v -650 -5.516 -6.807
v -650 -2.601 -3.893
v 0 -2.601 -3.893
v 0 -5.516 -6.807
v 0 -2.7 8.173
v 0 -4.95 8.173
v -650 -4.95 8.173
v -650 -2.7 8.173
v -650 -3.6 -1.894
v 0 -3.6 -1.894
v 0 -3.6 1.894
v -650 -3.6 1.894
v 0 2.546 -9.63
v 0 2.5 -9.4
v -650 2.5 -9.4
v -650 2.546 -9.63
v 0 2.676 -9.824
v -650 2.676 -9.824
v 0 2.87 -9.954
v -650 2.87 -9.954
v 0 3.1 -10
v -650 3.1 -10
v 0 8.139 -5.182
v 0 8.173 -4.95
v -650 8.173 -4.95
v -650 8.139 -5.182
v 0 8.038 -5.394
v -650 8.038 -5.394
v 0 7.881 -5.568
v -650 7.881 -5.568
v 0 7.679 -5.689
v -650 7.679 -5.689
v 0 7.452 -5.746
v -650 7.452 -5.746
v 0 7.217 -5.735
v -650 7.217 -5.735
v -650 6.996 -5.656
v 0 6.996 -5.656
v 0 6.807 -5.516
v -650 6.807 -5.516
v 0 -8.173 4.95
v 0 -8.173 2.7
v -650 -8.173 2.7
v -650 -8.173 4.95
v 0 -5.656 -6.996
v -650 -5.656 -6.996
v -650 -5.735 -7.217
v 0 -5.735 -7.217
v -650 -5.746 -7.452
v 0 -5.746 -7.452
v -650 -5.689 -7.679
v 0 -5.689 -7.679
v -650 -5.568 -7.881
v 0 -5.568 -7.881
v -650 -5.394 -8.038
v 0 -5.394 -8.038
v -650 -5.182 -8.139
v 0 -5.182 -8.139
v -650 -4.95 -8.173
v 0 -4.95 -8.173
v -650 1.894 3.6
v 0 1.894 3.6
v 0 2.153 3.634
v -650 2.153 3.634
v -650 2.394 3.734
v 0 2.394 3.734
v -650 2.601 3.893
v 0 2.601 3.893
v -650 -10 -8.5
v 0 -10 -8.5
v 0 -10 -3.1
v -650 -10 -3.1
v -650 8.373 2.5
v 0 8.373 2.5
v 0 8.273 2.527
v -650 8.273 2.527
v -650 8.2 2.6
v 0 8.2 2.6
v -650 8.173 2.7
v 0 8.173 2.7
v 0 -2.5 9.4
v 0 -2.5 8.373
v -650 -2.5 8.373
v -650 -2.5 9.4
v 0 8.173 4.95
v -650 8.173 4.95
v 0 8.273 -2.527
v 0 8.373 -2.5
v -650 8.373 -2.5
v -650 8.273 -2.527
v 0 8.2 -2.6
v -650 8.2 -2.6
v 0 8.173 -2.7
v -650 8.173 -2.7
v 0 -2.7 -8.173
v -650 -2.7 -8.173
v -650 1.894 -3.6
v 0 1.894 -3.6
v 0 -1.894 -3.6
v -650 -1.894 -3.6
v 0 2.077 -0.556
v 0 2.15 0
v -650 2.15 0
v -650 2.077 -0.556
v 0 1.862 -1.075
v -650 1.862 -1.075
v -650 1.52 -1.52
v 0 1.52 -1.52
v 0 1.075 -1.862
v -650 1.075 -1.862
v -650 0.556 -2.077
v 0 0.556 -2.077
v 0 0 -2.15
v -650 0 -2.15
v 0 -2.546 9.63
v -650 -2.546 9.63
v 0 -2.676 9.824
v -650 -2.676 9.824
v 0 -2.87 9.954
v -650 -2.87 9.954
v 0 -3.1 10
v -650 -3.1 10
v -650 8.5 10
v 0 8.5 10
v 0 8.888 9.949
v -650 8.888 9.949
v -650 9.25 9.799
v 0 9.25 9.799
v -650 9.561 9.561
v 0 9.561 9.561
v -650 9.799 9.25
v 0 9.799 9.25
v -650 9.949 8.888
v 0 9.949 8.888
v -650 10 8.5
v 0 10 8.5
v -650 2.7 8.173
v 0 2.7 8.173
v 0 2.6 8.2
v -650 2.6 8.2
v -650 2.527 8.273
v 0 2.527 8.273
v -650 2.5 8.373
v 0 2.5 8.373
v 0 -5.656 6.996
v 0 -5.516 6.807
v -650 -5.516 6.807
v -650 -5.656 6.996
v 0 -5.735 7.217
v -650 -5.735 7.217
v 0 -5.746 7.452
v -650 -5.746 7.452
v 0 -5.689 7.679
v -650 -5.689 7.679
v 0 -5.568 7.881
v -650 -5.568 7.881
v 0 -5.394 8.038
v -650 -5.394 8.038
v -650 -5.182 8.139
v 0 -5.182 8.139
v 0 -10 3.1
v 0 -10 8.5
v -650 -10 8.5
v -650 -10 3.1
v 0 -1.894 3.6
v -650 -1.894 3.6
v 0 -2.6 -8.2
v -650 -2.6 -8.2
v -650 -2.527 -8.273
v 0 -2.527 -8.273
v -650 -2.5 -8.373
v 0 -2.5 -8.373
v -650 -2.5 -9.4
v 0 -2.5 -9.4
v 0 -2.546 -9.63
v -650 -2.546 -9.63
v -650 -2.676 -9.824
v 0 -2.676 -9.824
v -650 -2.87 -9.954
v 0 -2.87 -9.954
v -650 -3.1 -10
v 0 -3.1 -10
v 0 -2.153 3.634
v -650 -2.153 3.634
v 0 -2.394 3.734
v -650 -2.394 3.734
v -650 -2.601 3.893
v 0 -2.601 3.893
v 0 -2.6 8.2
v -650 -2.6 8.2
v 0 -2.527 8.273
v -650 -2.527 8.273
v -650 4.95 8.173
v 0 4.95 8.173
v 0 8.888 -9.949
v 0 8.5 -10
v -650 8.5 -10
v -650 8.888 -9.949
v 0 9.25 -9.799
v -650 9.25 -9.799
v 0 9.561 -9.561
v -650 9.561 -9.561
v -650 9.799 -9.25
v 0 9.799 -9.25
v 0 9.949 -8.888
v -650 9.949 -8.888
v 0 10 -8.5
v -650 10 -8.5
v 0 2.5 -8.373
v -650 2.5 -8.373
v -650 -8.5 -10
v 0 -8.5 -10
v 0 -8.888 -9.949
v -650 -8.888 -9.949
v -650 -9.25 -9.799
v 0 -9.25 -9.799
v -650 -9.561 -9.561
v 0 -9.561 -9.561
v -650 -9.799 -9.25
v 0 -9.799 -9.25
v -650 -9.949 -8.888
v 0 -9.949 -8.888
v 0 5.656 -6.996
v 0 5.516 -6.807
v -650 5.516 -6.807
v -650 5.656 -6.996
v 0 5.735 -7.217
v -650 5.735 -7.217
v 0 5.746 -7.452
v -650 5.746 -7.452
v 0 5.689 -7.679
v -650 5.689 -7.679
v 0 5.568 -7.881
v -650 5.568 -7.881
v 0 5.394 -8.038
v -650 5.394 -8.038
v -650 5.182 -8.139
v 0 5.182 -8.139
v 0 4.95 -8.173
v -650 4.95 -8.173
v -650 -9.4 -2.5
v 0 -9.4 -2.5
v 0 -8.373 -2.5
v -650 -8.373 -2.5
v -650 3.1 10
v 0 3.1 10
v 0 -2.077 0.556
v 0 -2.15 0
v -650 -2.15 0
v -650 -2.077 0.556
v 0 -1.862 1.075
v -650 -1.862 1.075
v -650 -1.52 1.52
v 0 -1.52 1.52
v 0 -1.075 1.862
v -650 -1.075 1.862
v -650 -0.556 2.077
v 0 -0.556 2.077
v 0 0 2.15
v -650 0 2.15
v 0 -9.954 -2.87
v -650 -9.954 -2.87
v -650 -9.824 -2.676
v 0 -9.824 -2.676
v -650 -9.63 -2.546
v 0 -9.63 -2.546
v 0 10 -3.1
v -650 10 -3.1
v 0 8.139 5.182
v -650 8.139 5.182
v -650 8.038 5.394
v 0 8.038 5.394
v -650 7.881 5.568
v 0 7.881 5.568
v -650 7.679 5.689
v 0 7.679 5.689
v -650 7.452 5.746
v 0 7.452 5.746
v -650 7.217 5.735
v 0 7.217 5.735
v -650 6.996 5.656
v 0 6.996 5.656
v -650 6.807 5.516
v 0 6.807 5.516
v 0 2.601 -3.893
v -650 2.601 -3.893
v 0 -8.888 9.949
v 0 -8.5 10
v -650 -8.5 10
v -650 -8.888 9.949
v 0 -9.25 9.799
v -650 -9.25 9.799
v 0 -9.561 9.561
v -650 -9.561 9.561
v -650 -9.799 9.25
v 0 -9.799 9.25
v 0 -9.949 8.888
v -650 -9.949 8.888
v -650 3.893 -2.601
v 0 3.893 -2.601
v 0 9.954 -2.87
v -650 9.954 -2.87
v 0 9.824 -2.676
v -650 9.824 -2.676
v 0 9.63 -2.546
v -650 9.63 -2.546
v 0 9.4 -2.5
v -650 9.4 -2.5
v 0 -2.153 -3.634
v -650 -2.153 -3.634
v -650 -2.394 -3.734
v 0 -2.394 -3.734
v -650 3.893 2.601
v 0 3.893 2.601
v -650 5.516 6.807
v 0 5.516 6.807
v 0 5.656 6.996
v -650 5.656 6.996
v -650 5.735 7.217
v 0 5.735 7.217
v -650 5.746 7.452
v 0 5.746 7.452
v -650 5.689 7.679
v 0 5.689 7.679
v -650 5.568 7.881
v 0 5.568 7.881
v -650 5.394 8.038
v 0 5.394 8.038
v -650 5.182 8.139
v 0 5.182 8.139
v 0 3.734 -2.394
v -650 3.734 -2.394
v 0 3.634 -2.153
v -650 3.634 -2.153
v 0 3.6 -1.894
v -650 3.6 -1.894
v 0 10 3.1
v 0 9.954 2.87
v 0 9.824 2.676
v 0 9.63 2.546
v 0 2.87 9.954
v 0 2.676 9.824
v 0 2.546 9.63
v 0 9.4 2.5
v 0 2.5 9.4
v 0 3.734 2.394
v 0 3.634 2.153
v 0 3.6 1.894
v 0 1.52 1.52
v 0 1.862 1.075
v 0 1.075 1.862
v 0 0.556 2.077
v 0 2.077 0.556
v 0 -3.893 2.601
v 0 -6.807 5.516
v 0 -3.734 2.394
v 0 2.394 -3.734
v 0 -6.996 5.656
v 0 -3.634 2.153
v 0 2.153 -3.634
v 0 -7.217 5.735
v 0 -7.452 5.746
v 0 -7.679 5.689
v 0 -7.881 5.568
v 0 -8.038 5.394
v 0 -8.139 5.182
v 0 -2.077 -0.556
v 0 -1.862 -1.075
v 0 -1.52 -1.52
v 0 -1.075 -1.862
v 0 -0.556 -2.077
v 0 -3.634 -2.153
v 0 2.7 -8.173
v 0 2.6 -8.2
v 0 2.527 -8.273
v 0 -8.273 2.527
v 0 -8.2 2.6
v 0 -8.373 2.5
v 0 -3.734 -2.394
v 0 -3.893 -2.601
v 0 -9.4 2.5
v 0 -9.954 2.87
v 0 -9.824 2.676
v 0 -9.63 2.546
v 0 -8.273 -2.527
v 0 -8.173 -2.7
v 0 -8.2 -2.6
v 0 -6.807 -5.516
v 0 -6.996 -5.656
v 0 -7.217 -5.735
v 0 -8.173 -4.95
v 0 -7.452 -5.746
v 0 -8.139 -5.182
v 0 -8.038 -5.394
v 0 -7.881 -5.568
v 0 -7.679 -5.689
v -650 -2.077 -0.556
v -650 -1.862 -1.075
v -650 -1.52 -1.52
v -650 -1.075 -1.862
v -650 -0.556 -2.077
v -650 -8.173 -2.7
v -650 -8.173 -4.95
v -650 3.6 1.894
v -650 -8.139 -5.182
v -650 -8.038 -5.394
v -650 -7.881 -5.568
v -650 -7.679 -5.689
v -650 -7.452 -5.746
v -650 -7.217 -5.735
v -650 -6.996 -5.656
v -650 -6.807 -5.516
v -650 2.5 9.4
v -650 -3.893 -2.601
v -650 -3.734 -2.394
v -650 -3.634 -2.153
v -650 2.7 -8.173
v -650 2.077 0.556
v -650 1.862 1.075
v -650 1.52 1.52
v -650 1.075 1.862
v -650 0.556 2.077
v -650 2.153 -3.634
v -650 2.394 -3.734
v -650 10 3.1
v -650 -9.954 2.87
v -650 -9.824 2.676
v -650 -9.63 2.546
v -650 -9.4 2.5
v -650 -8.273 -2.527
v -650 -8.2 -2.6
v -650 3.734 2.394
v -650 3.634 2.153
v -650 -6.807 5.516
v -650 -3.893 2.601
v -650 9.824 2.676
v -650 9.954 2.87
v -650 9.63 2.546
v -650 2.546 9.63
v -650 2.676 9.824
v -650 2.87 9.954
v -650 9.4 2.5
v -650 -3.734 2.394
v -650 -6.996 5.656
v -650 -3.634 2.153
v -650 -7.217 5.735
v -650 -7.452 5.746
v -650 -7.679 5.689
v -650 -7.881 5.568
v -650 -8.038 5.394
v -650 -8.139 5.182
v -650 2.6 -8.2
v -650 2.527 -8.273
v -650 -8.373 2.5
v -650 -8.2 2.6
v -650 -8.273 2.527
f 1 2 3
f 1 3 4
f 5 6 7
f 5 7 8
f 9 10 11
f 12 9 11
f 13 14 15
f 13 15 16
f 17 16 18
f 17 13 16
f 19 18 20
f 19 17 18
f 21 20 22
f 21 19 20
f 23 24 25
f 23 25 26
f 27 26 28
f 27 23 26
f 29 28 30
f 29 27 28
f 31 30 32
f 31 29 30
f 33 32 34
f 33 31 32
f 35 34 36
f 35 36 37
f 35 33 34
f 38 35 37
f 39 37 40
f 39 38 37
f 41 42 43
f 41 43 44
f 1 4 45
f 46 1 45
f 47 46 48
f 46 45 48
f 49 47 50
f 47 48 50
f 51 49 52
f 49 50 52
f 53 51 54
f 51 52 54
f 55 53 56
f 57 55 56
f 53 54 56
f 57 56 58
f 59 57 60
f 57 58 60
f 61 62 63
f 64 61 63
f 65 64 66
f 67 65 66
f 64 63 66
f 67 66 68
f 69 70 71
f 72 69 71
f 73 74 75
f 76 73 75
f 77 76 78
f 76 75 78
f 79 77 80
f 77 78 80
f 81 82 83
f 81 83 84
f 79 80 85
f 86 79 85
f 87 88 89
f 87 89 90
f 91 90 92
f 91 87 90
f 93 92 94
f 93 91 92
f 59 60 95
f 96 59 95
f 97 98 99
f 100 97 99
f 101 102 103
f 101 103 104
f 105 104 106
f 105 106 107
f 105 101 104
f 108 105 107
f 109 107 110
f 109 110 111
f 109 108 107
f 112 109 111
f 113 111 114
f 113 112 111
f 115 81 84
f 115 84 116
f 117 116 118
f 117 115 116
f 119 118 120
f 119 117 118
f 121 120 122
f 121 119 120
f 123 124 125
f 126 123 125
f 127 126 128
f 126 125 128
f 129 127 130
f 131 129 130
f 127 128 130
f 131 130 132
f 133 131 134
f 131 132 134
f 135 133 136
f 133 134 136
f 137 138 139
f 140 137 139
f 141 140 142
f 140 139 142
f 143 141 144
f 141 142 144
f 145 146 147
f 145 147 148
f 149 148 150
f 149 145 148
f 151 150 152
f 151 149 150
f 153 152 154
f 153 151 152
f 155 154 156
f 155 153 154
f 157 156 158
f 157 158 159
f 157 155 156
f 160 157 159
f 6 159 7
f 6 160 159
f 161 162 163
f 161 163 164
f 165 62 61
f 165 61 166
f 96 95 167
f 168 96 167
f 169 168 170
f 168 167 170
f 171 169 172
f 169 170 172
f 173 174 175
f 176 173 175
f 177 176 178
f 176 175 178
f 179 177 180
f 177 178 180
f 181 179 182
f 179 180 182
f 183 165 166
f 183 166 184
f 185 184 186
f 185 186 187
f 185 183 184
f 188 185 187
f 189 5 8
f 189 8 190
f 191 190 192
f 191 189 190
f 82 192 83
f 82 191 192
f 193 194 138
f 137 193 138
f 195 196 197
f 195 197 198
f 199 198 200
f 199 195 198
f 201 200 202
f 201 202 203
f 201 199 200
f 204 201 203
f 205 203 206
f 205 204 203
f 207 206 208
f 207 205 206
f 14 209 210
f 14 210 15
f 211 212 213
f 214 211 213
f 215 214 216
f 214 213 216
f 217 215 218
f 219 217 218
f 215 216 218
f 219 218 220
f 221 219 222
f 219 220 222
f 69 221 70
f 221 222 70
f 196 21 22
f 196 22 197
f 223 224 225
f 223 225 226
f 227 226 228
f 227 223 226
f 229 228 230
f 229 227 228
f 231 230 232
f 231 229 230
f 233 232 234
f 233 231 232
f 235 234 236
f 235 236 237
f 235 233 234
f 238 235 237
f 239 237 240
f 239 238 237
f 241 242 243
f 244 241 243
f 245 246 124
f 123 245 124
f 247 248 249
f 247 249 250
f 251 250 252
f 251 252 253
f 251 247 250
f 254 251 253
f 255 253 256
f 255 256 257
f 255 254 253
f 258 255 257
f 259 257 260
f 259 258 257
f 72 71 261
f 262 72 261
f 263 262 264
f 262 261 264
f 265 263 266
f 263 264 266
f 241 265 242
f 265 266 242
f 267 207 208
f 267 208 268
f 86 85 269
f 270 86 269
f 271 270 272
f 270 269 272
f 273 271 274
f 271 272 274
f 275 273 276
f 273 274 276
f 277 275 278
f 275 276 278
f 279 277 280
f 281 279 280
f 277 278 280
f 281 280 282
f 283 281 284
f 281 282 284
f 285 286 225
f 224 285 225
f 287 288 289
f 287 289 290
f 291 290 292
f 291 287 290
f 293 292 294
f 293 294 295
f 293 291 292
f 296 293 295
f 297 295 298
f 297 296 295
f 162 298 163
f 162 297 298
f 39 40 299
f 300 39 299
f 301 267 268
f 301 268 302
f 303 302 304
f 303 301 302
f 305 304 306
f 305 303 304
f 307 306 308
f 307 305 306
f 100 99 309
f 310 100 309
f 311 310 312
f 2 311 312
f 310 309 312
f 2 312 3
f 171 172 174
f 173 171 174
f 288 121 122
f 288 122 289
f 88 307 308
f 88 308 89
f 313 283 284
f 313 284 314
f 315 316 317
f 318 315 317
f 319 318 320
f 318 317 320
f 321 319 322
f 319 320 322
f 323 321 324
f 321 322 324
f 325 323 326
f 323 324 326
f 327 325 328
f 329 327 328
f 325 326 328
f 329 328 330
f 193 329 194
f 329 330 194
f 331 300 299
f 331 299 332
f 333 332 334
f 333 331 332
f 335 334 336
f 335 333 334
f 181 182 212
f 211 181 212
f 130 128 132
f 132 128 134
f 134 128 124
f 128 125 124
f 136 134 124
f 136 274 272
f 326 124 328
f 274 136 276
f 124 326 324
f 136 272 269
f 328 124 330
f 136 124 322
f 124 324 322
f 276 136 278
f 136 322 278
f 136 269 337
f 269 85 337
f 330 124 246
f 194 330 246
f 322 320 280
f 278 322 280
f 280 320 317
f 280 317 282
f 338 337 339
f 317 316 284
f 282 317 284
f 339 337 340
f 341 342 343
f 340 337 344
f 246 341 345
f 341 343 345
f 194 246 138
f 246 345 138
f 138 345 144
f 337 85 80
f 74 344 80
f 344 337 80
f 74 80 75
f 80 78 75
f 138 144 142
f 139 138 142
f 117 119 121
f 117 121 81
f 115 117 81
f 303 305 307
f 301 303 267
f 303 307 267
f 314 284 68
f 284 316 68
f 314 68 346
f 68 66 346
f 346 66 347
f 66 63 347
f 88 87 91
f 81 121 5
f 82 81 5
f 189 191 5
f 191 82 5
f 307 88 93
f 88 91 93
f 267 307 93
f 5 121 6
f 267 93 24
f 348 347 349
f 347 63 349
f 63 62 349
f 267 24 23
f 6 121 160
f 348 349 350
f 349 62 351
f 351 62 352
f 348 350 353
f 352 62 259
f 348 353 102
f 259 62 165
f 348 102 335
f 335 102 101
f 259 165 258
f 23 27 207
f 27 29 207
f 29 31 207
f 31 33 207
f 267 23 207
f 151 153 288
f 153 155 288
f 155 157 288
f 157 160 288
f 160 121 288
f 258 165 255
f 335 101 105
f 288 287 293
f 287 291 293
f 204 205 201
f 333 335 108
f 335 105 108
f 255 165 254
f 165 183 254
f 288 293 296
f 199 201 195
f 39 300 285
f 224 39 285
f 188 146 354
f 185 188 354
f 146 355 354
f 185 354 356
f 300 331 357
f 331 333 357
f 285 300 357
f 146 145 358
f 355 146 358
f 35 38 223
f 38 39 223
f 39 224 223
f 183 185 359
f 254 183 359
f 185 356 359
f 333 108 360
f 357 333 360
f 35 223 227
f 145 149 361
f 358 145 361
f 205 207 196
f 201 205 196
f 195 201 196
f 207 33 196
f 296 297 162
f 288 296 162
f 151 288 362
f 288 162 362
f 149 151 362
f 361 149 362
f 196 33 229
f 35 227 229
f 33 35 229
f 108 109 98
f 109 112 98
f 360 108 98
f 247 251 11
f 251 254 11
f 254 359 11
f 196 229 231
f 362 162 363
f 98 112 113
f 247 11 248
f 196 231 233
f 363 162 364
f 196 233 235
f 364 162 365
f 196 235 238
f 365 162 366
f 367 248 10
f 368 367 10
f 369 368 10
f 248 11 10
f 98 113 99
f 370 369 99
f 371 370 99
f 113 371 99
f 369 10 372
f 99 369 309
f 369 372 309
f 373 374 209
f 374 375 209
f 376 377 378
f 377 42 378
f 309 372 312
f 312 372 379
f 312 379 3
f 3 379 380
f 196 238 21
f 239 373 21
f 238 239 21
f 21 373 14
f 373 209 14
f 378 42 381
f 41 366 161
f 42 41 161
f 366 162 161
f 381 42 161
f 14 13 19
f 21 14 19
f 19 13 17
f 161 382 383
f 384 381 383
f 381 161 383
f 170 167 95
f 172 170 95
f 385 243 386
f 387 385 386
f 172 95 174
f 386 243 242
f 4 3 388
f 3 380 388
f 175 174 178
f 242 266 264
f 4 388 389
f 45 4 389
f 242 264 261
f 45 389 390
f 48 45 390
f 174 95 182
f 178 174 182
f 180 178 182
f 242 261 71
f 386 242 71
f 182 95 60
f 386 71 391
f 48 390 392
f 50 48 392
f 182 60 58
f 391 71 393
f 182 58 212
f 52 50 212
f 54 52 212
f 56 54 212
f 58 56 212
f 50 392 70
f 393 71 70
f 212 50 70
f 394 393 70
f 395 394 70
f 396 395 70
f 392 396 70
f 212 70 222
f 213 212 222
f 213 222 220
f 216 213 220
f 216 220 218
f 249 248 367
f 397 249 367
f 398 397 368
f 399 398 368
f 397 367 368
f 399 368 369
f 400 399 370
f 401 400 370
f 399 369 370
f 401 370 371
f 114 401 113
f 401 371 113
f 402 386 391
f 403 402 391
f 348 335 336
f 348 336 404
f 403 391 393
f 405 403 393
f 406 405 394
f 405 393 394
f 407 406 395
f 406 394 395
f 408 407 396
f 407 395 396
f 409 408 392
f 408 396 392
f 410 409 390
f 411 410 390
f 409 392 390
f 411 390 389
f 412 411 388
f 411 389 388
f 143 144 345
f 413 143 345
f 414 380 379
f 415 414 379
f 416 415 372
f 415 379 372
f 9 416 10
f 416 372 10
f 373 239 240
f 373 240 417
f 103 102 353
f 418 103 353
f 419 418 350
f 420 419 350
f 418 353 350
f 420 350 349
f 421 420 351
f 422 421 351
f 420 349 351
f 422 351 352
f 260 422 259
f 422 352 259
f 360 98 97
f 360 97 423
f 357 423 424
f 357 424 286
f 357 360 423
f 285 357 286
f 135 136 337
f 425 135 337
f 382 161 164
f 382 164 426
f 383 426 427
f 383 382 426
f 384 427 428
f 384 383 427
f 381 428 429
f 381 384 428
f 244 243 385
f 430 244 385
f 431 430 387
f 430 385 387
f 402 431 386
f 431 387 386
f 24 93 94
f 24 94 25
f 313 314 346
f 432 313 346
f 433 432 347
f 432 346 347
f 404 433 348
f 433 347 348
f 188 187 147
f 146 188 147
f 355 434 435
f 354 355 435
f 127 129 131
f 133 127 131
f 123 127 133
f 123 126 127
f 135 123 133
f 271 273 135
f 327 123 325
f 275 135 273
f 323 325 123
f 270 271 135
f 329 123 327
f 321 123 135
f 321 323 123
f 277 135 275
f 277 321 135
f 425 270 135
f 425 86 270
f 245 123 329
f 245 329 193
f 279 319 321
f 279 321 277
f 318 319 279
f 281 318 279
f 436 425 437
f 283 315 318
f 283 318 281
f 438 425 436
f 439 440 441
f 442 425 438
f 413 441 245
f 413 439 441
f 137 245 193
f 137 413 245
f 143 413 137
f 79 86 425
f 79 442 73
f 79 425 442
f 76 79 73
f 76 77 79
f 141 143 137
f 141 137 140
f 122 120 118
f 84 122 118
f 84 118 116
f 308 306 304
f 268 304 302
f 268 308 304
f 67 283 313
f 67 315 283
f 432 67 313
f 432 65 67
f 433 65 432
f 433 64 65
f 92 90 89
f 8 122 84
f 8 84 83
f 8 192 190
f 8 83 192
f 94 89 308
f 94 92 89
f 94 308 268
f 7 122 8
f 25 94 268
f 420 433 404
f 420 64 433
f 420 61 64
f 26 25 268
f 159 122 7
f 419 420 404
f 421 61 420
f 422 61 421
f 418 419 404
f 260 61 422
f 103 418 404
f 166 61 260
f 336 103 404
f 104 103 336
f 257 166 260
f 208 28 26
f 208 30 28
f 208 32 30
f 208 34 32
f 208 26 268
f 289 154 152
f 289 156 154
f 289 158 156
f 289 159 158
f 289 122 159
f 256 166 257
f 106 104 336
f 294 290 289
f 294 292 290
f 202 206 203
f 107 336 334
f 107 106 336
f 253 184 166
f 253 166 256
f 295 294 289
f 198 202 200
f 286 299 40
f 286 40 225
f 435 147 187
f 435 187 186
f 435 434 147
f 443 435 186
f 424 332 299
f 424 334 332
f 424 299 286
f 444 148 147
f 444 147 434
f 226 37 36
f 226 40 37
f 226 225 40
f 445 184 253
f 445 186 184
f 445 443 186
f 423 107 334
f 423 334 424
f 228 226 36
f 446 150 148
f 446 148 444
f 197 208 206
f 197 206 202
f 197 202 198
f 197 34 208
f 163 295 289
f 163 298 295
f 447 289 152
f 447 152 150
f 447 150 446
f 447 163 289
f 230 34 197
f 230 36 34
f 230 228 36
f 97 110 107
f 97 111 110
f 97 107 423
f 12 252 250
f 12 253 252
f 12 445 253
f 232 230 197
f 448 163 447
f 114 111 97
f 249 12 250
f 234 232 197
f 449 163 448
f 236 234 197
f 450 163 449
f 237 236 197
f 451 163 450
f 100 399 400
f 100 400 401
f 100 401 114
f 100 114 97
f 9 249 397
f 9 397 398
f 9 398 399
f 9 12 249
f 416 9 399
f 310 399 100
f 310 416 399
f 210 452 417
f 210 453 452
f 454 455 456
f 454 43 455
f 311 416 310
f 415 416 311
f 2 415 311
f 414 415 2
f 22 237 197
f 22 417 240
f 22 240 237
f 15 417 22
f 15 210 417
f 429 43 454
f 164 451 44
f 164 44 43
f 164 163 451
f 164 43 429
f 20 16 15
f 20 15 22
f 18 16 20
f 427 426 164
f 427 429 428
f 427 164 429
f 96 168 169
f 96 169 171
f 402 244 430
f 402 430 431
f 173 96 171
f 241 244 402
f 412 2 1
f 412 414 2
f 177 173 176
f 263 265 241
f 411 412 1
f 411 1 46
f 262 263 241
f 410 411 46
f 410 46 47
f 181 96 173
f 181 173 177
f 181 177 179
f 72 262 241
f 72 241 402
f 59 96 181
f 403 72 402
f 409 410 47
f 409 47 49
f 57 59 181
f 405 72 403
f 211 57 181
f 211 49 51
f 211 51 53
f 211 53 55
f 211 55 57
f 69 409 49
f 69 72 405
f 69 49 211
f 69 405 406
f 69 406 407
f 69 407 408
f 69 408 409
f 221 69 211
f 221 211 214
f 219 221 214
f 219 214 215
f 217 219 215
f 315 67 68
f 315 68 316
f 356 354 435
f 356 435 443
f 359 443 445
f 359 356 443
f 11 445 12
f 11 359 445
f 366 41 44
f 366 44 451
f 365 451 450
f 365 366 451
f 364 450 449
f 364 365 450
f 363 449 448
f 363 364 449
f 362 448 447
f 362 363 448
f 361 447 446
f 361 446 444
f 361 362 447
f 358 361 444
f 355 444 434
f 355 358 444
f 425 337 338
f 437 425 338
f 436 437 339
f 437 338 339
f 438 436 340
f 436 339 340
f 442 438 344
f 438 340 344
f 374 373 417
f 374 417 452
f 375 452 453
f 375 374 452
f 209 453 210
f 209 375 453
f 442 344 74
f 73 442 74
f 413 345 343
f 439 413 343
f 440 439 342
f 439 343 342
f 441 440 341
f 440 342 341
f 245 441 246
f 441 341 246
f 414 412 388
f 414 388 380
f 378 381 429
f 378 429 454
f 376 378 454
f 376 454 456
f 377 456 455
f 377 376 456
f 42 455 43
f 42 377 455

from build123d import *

# Parameters (mm, degrees)
BOSS_EXTRUDE1_DEPTH = 650


with BuildPart() as part:
    # Sketch3 → Boss-Extrude1 (new body)
    with BuildSketch(Plane(origin=(0, 0, 0), x_dir=(0, 0, -1), z_dir=(1, 0, 0))):
        with BuildLine():
            Line((-5.515685425, 6.807463915), (-2.601114729, 3.892893219))
            ThreePointArc((-2.601114729, 3.892893219), (-2.27669138, 3.676120467), (-1.894007948, 3.6))
            Line((-1.894007948, 3.6), (0, 3.6))
            Line((0, 3.6), (0, 2.15))
            ThreePointArc((0, 2.15), (-1.52027958, 1.52027958), (-2.15, 0))
            Line((-2.15, 0), (-3.6, 0))
            Line((-3.6, 0), (-3.6, 1.894007948))
            ThreePointArc((-3.6, 1.894007948), (-3.676120467, 2.27669138), (-3.892893219, 2.601114729))
            Line((-3.892893219, 2.601114729), (-6.807463915, 5.515685425))
            ThreePointArc((-6.807463915, 5.515685425), (-7.679296086, 5.689103626), (-8.17314934, 4.95))
            Line((-8.17314934, 4.95), (-8.17314934, 2.7))
            ThreePointArc((-8.17314934, 2.7), (-8.231727984, 2.558578644), (-8.37314934, 2.5))
            Line((-8.37314934, 2.5), (-9.4, 2.5))
            ThreePointArc((-9.4, 2.5), (-9.824264069, 2.675735931), (-10, 3.1))
            Line((-10, 3.1), (-10, 8.5))
            ThreePointArc((-10, 8.5), (-9.560660172, 9.560660172), (-8.5, 10))
            Line((-8.5, 10), (-3.1, 10))
            ThreePointArc((-3.1, 10), (-2.675735931, 9.824264069), (-2.5, 9.4))
            Line((-2.5, 9.4), (-2.5, 8.37314934))
            ThreePointArc((-2.5, 8.37314934), (-2.558578644, 8.231727984), (-2.7, 8.17314934))
            Line((-2.7, 8.17314934), (-4.95, 8.17314934))
            ThreePointArc((-4.95, 8.17314934), (-5.689103626, 7.679296086), (-5.515685425, 6.807463915))
        make_face()
    extrude(amount=-BOSS_EXTRUDE1_DEPTH)

    # Mirror1: part across plane


with BuildPart() as part_1:
    add(part.part)
    add(part.part.mirror(Plane.ZX))

    # Mirror2: part across plane


with BuildPart() as part_2:
    add(part_1.part)
    add(part_1.part.mirror(Plane.XY))


solid = part_2.part
